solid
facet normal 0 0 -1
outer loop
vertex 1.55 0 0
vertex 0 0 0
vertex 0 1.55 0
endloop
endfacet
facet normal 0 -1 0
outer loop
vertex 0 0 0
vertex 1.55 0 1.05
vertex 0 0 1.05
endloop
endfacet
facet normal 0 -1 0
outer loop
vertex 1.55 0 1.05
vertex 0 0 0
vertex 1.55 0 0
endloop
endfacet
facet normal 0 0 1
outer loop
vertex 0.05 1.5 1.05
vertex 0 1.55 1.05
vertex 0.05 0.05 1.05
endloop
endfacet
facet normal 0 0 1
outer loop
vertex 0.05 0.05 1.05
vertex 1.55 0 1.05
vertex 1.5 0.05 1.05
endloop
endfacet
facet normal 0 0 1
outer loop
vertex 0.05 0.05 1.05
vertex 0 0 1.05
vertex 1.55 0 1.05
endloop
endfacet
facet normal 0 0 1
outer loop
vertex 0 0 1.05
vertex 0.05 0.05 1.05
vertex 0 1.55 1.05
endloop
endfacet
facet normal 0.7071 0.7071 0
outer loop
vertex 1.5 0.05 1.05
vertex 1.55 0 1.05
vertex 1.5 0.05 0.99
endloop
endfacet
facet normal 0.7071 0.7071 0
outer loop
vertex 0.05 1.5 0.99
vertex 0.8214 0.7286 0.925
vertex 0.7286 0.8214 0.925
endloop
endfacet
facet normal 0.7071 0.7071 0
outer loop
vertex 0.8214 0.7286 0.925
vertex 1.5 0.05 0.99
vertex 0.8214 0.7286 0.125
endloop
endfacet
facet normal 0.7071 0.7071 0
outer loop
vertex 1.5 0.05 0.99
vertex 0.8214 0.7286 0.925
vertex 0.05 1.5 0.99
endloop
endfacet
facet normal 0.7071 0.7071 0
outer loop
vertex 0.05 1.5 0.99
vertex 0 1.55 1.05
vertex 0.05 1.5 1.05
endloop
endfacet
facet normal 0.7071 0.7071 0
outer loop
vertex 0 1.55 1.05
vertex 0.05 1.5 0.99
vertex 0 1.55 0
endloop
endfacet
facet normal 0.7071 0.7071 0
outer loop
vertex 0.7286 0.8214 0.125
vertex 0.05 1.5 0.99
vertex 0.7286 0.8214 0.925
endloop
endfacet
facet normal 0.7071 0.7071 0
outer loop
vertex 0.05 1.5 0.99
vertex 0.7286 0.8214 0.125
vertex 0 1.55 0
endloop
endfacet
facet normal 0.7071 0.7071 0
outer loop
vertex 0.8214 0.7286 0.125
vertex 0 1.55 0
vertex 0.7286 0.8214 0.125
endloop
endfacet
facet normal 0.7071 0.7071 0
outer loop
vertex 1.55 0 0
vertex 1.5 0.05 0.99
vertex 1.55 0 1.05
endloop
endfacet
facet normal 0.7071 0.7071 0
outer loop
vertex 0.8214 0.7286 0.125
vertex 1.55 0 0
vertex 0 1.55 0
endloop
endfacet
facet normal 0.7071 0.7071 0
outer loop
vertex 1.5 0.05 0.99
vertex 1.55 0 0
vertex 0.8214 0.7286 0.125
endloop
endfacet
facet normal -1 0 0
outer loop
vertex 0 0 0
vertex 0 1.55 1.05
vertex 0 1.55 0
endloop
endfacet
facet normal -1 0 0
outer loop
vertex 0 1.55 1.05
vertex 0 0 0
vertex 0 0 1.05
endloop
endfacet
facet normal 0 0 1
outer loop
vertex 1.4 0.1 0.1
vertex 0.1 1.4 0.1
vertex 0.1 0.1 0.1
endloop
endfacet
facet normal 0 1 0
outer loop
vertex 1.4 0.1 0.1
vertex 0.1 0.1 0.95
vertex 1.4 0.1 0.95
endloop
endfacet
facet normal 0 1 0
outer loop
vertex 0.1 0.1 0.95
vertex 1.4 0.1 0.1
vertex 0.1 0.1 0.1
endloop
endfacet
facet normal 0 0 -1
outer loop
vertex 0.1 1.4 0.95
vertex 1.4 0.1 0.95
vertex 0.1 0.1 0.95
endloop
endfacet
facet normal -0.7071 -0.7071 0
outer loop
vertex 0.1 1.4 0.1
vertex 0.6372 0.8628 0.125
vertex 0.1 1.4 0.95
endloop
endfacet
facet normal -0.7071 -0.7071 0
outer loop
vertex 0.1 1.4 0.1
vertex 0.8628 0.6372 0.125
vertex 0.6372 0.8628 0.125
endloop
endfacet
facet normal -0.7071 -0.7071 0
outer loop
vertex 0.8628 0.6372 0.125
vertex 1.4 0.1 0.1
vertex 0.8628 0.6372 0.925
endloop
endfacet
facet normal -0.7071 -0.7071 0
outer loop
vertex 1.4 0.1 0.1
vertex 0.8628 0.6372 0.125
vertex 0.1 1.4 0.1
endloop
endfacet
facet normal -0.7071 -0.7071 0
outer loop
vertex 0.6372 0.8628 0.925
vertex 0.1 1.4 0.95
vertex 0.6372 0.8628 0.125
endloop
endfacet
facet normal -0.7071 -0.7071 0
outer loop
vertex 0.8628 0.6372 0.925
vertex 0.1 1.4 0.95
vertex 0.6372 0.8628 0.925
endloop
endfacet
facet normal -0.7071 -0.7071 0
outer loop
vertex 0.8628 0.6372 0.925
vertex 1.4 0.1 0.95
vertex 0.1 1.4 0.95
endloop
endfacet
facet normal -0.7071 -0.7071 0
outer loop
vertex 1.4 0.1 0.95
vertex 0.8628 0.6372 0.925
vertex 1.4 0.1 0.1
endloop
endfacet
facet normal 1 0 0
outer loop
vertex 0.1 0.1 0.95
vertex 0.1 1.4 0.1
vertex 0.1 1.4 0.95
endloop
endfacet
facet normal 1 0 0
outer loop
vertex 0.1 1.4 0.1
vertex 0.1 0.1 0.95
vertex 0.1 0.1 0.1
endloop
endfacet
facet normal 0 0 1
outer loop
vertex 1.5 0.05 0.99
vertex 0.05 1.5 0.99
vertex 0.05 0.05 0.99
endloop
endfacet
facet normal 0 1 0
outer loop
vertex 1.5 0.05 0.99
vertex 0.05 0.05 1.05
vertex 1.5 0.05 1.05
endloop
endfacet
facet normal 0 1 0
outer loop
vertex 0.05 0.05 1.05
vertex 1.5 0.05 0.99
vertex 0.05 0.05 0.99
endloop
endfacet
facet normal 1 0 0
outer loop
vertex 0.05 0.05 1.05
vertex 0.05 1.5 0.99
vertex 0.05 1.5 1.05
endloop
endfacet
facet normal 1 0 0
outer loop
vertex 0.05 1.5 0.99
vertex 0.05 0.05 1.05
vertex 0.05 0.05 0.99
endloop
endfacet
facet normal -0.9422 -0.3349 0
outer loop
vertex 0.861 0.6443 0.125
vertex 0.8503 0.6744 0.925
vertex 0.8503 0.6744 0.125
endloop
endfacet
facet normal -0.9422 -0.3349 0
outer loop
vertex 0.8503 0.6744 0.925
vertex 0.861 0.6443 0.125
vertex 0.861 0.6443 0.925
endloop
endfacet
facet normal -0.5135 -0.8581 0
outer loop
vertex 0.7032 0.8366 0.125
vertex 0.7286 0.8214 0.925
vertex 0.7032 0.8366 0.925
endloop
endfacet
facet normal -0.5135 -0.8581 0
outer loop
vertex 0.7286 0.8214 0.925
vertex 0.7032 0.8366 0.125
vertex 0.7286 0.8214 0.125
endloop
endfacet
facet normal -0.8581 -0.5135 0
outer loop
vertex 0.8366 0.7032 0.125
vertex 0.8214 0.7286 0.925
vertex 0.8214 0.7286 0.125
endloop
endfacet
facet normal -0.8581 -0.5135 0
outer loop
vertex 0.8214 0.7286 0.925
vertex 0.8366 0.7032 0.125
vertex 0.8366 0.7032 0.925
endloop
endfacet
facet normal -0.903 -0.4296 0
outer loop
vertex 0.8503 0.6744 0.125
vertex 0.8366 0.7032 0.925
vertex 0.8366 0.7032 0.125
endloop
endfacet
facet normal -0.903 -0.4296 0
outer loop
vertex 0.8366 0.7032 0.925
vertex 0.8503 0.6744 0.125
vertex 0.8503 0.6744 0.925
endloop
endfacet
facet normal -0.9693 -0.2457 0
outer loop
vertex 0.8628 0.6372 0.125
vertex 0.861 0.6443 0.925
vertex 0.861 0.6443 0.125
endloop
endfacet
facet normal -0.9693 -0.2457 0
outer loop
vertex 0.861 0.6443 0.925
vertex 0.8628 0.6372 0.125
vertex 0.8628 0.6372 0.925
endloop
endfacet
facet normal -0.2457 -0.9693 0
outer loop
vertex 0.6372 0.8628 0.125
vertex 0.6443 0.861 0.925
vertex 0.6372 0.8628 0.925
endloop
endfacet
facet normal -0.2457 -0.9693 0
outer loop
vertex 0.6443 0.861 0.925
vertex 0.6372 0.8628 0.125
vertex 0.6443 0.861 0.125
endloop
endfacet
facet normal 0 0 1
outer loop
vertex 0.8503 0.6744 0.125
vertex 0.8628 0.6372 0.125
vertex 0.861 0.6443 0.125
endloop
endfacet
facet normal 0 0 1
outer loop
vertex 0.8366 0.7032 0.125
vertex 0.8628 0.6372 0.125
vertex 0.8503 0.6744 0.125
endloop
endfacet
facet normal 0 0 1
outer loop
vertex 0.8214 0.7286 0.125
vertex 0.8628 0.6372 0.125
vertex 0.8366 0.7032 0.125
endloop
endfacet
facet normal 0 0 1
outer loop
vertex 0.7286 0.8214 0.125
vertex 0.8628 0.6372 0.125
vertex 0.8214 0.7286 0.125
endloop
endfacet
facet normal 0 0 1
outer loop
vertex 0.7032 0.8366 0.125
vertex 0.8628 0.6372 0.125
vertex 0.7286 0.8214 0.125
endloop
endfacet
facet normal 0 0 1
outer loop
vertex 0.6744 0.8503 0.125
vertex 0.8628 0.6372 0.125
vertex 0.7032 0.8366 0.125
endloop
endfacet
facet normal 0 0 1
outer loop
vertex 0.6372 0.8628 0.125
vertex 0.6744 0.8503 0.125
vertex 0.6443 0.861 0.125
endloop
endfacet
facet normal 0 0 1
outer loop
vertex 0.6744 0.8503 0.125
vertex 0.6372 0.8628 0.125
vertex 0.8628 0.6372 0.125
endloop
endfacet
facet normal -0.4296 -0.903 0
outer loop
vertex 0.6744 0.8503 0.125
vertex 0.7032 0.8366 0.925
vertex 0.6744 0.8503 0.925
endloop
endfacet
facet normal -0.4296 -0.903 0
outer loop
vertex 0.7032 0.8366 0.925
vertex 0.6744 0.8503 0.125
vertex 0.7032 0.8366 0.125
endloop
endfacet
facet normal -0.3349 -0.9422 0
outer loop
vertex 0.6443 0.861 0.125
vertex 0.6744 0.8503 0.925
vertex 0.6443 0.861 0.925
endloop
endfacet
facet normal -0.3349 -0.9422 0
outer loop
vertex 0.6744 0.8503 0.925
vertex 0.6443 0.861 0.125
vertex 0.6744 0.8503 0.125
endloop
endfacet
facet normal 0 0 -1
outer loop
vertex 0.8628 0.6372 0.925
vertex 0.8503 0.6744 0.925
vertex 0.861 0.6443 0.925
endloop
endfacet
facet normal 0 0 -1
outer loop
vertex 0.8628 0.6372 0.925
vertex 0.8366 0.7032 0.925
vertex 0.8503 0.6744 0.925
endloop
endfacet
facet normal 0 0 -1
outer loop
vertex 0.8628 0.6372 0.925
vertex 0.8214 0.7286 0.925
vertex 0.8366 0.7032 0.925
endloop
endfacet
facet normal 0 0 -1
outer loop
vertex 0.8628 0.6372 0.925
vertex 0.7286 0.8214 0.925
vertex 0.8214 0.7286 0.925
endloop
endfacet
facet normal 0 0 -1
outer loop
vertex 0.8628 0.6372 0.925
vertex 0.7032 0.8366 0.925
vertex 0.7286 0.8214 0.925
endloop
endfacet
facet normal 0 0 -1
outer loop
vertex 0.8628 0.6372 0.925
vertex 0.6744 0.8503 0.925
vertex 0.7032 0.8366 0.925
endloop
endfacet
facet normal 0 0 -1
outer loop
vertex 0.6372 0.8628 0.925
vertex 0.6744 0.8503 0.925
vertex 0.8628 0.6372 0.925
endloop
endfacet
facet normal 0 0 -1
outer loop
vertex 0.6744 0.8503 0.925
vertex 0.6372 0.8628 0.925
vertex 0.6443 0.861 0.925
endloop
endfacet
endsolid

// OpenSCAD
// Industrial USB Hub Infrastructure - IP67 Waterproof Corner Cut Module
$fn = 64; 

block_width    = 1.55; // Slightly scaled to accommodate sealing gasket tracks
block_height   = 1.55; 
block_length   = 1.05; 
wall_thickness = 0.10; // Thickened to 2.5mm for water pressure handling

module waterproof_corner_block() {
    difference() {
        // 1. Primary Structural Body (Standard Fire Red Profile)
        linear_extrude(height = block_length) {
            polygon(points=[[0,0], [block_width,0], [0,block_height]]);
        }
        
        // 2. Sealed Internal Electronic Cavity
        translate([wall_thickness, wall_thickness, wall_thickness])
            linear_extrude(height = block_length - (wall_thickness * 2)) {
                polygon(points=[[0,0], [block_width - 0.25, 0], [0, block_height - 0.25]]);
            }
            
        // 3. Continuous Perimeter Gasket Groove (For O-Ring or Elastomeric Seal)
        // Blocks entry of ceiling leaks or high-pressure spray wash-downs
        translate([0.05, 0.05, block_length - 0.06])
            linear_extrude(height = 0.08) {
                polygon(points=[[0,0], [block_width - 0.1, 0], [0, block_height - 0.1]]);
            }

        // 4. IP67 Waterproof Threaded USB-B Interface Cutout
        // Circular profile to accommodate waterproof threaded panel couplings
        translate([0.55, 0.55, block_length / 2])
            rotate([0, 0, -45])
                cylinder(h = 0.8, d = 0.65, center=true); // 16.5mm standard IP67 threaded collar hole
    }
}

waterproof_corner_block();
